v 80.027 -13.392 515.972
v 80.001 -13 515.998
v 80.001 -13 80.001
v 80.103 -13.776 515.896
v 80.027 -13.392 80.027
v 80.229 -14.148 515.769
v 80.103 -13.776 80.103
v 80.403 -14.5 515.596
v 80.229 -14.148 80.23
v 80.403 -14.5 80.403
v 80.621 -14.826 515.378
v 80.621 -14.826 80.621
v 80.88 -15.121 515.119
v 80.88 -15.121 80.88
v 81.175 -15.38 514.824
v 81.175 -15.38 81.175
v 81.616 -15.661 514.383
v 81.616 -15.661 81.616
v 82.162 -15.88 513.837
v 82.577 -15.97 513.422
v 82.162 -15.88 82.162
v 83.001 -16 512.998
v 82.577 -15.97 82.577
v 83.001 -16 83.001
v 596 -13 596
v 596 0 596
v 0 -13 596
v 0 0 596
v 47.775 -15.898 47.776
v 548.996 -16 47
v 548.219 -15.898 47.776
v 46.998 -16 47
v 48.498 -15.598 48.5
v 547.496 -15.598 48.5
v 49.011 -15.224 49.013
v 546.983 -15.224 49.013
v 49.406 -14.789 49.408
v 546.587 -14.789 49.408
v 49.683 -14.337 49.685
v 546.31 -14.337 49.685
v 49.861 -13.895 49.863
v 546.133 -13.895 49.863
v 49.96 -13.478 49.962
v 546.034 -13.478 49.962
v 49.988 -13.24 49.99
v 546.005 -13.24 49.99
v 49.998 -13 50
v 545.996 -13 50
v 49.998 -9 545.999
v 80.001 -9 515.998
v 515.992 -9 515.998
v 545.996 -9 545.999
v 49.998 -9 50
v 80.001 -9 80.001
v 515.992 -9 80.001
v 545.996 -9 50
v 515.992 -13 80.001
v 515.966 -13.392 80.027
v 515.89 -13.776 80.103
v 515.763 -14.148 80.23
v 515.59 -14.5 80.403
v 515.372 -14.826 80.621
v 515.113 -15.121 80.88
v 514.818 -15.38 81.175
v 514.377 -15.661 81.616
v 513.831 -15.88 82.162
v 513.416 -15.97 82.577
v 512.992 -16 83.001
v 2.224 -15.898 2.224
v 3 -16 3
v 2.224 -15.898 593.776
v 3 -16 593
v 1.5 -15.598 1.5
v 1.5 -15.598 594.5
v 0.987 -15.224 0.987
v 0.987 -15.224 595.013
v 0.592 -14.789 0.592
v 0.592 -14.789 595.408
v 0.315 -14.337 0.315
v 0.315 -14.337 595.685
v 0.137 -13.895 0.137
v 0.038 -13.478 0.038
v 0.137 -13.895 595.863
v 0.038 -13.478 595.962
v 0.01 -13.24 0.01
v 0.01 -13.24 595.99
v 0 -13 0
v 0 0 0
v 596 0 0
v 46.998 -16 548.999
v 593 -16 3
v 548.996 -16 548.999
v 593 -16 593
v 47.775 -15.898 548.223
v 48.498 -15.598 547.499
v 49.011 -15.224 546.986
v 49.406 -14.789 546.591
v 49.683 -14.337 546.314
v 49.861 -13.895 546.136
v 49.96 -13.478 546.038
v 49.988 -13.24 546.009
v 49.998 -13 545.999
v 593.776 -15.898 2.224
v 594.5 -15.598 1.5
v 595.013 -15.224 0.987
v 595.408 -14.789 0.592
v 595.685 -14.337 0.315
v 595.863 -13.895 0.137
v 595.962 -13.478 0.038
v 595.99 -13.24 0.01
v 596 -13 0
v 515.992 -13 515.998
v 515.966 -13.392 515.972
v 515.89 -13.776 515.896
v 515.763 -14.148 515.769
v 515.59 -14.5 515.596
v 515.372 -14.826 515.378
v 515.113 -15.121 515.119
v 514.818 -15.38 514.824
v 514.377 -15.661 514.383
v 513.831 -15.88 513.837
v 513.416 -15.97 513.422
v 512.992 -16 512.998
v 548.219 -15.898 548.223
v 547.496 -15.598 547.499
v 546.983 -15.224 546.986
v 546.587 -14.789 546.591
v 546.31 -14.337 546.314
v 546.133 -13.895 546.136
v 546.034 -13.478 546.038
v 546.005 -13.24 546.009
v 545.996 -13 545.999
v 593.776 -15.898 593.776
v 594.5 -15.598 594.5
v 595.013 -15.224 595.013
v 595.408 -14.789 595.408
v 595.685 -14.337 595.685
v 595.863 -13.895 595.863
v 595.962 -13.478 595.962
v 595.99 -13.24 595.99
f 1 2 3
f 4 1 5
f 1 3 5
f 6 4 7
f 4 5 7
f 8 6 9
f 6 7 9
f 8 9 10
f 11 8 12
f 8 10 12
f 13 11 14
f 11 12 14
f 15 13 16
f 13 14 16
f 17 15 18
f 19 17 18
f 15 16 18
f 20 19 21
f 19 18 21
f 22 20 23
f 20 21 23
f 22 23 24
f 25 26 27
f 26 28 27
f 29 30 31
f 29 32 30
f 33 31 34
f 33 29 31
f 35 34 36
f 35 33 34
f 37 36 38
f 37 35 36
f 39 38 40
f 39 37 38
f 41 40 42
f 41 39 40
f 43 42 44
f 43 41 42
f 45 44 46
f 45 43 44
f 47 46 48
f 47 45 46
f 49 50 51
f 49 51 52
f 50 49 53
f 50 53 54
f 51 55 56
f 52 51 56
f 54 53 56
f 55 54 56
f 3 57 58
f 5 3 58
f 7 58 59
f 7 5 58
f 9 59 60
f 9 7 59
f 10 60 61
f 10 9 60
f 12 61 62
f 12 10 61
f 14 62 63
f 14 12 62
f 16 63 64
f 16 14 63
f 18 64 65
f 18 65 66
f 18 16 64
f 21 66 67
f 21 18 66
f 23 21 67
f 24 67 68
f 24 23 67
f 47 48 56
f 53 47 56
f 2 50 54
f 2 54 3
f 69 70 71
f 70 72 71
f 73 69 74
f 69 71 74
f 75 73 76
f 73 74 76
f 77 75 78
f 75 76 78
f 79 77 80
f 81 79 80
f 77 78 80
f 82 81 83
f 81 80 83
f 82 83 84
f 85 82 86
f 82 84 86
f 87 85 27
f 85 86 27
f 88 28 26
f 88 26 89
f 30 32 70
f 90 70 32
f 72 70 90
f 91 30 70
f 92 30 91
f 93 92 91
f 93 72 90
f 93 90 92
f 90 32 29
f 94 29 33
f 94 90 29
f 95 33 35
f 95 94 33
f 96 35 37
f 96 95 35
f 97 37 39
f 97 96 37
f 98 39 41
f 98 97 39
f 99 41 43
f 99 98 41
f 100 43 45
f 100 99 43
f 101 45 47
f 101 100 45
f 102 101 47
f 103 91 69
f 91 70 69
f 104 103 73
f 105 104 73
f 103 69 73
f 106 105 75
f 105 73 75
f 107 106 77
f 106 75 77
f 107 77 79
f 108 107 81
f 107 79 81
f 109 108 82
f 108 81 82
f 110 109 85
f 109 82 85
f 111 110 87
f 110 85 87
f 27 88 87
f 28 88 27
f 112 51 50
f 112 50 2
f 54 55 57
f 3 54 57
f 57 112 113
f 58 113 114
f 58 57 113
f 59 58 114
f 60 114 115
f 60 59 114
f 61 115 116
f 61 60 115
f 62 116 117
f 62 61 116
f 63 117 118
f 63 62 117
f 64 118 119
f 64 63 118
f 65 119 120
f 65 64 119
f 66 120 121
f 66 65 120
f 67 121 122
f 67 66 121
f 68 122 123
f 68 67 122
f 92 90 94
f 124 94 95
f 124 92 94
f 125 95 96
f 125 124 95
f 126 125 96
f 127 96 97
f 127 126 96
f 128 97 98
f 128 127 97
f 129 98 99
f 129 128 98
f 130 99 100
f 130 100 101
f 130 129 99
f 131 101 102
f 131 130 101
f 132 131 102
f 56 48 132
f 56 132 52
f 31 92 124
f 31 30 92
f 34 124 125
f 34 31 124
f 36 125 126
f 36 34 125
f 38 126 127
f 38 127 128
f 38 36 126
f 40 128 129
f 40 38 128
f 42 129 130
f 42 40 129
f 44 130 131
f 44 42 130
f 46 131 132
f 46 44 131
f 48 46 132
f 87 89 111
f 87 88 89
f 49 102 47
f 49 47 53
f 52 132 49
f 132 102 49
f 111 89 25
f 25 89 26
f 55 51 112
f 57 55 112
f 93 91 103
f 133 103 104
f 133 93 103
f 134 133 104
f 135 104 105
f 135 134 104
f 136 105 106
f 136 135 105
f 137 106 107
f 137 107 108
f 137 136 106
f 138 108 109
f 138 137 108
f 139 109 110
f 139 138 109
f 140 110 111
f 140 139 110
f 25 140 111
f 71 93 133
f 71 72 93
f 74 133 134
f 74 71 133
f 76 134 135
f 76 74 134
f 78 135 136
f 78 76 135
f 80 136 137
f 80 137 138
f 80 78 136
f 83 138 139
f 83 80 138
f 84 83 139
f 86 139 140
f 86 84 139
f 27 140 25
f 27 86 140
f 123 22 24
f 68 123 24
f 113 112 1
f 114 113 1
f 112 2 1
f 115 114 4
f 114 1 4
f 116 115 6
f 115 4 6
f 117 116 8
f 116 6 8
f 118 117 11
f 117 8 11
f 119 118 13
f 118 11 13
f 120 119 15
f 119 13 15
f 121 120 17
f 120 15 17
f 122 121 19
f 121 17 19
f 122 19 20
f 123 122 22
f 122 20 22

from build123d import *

# Parameters (mm, degrees)
F0_W      = 44.656470418
F0_H      = 33.8078811765
F1_DEPTH  = 16
F2_DEPTH  = 796
F3_DEPTH  = 196
F4_W      = 68.9578056335
F4_H      = 493.6993122101
F5_DEPTH  = 7
F6_DEPTH  = 9.7
F7_DEPTH  = 99.33
F8_DEPTH  = 99.33
F9_DEPTH  = 17.34
F10_DEPTH = 102.97
F11_W     = 35.2807044983
F11_H     = 492.0964837074
F12_DEPTH = 7
F13_DEPTH = 37.27
F14_DEPTH = 6.58
F15_DEPTH = 106.63
F16_DEPTH = 5.87
F17_DEPTH = 200
F18_DEPTH = 200
F19_DEPTH = 200
F20_DEPTH = 200
F21_DEPTH = 200
F22_DEPTH = 200
F23_DEPTH = 200
F24_DEPTH = 200
F25_DEPTH = 200
F26_R     = 3


with BuildPart() as f1:
    # F0 (on Front) → F1 (new body)
    with BuildSketch(Plane.XZ):
        with Locations((22.328235209, 16.9039405882)):
            Rectangle(F0_W, F0_H)
    extrude(amount=F1_DEPTH)

    # F2 (add): a face of the model
    f2_faces = [f1.faces().sort_by_distance(p)[0] for p in [
        (22.328235209, -8, 0),
    ]]
    extrude(f2_faces, amount=-F2_DEPTH)

    # F3 (add): a face of the model
    f3_faces = [f1.faces().sort_by_distance(p)[0] for p in [
        (0, -8, 398),
    ]]
    extrude(f3_faces, amount=-F3_DEPTH)

    # F4 (on face) → F5 (cut)
    with BuildSketch(Plane.XZ.offset(16)):
        with Locations((94.1769480705, 399.8196721077)):
            Rectangle(F4_W, F4_H)
    extrude(amount=-F5_DEPTH, mode=Mode.SUBTRACT)

    # F6 (cut): a face of the model
    f6_faces = [f1.faces().sort_by_distance(p)[0] for p in [
        (59.6980452538, -12.5, 399.8196721077),
    ]]
    extrude(f6_faces, amount=-F6_DEPTH, mode=Mode.SUBTRACT)

    # F7 (add): a face of the model
    f7_faces = [f1.faces().sort_by_distance(p)[0] for p in [
        (89.3269480705, -12.5, 646.6693282127),
    ]]
    extrude(f7_faces, amount=-F7_DEPTH)

    # F8 (cut): a face of the model
    f8_faces = [f1.faces().sort_by_distance(p)[0] for p in [
        (89.3269480705, -12.5, 646.6693282127),
    ]]
    extrude(f8_faces, amount=-F8_DEPTH, mode=Mode.SUBTRACT)

    # F9 (cut): a face of the model
    f9_faces = [f1.faces().sort_by_distance(p)[0] for p in [
        (128.6558508873, -12.5, 449.4846721077),
    ]]
    extrude(f9_faces, amount=-F9_DEPTH, mode=Mode.SUBTRACT)

    # F10 (cut): a face of the model
    f10_faces = [f1.faces().sort_by_distance(p)[0] for p in [
        (97.9969480705, -12.5, 152.9700160027),
    ]]
    extrude(f10_faces, amount=-F10_DEPTH, mode=Mode.SUBTRACT)

    # F11 (on face) → F12 (join)
    with BuildSketch(Plane.XZ.offset(9)):
        with Locations((91.7714834213, 432.6795041561)):
            Rectangle(F11_W, F11_H)
    extrude(amount=F12_DEPTH)

    # F13 (add): a face of the model
    f13_faces = [f1.faces().sort_by_distance(p)[0] for p in [
        (91.7714834213, -12.5, 678.7277460098),
    ]]
    extrude(f13_faces, amount=F13_DEPTH)

    # F14 (add): a face of the model
    f14_faces = [f1.faces().sort_by_distance(p)[0] for p in [
        (109.4118356705, -12.5, 451.3145041561),
    ]]
    extrude(f14_faces, amount=F14_DEPTH)

    # F15 (add): a face of the model
    f15_faces = [f1.faces().sort_by_distance(p)[0] for p in [
        (95.0614834213, -12.5, 186.6312623024),
    ]]
    extrude(f15_faces, amount=F15_DEPTH)

    # F16 (cut): a face of the model
    f16_faces = [f1.faces().sort_by_distance(p)[0] for p in [
        (74.1311311722, -12.5, 397.9995041561),
    ]]
    extrude(f16_faces, amount=-F16_DEPTH, mode=Mode.SUBTRACT)

    # F17 (add): a face of the model
    f17_faces = [f1.faces().sort_by_distance(p)[0] for p in [
        (196, -8, 398),
    ]]
    extrude(f17_faces, amount=F17_DEPTH)

    # F18 (cut): a face of the model
    f18_faces = [f1.faces().sort_by_distance(p)[0] for p in [
        (145.9958508873, -12.5, 397.9996721077),
    ]]
    extrude(f18_faces, amount=-F18_DEPTH, mode=Mode.SUBTRACT)

    # F19 (add): a face of the model
    f19_faces = [f1.faces().sort_by_distance(p)[0] for p in [
        (115.9918356705, -12.5, 397.9995041561),
    ]]
    extrude(f19_faces, amount=F19_DEPTH)

    # F20 (add): a face of the model
    f20_faces = [f1.faces().sort_by_distance(p)[0] for p in [
        (396, -8, 398),
    ]]
    extrude(f20_faces, amount=F20_DEPTH)

    # F21 (cut): a face of the model
    f21_faces = [f1.faces().sort_by_distance(p)[0] for p in [
        (345.9958508873, -12.5, 397.9996721077),
    ]]
    extrude(f21_faces, amount=-F21_DEPTH, mode=Mode.SUBTRACT)

    # F22 (add): a face of the model
    f22_faces = [f1.faces().sort_by_distance(p)[0] for p in [
        (315.9918356705, -12.5, 397.9995041561),
    ]]
    extrude(f22_faces, amount=F22_DEPTH)

    # F23 (cut): a face of the model
    f23_faces = [f1.faces().sort_by_distance(p)[0] for p in [
        (297.9964834213, -12.5, 715.9977460098),
    ]]
    extrude(f23_faces, amount=-F23_DEPTH, mode=Mode.SUBTRACT)

    # F24 (add): a face of the model
    f24_faces = [f1.faces().sort_by_distance(p)[0] for p in [
        (297.9969480705, -12.5, 745.9993282127),
    ]]
    extrude(f24_faces, amount=F24_DEPTH)

    # F25 (cut): a face of the model
    f25_faces = [f1.faces().sort_by_distance(p)[0] for p in [
        (298, -8, 796),
    ]]
    extrude(f25_faces, amount=-F25_DEPTH, mode=Mode.SUBTRACT)

    # F26
    f26_edges = [f1.edges().sort_by_distance(p)[0] for p in [
        (0, -16, 298),
        (298, -16, 596),
        (596, -16, 298),
        (298, -16, 0),
        (49.998045, -16, 297.999672),
        (297.996948, -16, 50.000016),
        (297.996948, -16, 545.999328),
        (545.995851, -16, 297.999672),
        (297.996483, -16, 515.997746),
        (515.991836, -16, 297.999504),
        (297.996483, -16, 80.001262),
        (80.001131, -16, 297.999504),
    ]]
    fillet(f26_edges, radius=F26_R)


solid = f1.part
